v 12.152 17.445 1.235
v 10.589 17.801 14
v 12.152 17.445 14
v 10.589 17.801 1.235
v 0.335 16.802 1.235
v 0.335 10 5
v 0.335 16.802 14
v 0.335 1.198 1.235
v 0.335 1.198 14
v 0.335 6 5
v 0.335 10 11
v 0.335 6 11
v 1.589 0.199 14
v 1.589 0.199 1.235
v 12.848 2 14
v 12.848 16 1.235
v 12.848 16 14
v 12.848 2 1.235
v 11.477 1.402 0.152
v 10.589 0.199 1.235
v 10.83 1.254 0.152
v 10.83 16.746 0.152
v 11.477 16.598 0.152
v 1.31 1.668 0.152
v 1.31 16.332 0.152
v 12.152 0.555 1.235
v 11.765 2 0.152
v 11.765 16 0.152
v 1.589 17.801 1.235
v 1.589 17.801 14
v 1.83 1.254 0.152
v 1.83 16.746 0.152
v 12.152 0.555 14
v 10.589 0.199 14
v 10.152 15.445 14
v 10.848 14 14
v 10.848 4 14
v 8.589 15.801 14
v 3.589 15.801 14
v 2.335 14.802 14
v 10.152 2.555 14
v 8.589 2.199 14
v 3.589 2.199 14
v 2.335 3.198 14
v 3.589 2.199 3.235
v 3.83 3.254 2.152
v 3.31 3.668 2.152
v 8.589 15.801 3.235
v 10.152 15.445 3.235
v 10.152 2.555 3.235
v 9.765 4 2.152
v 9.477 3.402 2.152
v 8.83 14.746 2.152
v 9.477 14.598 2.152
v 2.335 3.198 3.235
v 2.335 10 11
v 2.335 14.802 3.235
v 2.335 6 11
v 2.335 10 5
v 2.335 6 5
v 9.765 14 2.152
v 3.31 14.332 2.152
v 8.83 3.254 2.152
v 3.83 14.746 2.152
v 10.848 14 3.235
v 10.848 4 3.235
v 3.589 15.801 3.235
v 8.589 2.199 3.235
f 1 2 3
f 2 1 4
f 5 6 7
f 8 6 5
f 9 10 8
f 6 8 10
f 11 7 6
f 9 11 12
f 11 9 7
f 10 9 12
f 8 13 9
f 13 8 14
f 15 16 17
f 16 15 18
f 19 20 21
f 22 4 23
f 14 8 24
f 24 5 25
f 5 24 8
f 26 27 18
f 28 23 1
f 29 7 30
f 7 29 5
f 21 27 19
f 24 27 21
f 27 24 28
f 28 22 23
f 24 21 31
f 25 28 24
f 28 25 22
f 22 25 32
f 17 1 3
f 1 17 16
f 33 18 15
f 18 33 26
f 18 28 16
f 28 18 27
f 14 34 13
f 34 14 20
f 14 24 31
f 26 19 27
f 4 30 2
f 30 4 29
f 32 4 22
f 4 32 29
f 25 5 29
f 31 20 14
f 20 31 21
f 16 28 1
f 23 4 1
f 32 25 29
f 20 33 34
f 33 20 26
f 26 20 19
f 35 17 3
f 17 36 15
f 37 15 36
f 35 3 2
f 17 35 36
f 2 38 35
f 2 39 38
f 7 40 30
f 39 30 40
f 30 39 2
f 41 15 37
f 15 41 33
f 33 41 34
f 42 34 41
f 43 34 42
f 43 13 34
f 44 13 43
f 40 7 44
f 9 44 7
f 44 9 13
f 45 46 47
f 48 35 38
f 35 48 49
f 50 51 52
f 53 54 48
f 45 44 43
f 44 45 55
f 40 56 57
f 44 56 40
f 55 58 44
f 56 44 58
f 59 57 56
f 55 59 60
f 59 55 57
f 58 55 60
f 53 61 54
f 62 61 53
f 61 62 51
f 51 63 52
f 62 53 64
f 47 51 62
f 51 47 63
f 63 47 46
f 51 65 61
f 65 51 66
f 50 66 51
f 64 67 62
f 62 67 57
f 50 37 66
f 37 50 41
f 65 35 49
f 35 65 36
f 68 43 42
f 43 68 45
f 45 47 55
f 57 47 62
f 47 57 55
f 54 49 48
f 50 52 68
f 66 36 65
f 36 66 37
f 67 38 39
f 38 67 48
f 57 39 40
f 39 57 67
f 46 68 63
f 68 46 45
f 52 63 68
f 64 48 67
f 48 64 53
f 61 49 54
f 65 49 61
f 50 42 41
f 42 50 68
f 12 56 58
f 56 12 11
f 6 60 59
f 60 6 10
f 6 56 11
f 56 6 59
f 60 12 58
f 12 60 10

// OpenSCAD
// file: ../utility/round-bottom-box.scad
module spheres(width,length,height,radius) {
  translate([radius,radius,radius]) sphere(radius);
  translate([width - radius, length - radius, radius]) sphere(radius);
  translate([width - radius, radius, radius]) sphere(radius);
  translate([radius, length - radius, radius]) sphere(radius);
}

module slicer(width, length, z_up, height) {
  translate([0, 0, z_up]) cube([width, length, height]); 
}

module round_bottom_box(width, length, height, radius) {
  difference() {
    hull() {
      spheres(width,length,height,radius);
      translate([0,0,height]) spheres(width,length,height,radius);
    }
    slicer(width, length, height+radius, radius+1);
  }
}

module hollow_round_bottom_box(width, length, height, radius, wall = 2) {
 inside_width = width - (2 * wall);
 inside_length = length - (2 * wall);
 inside_height = height;
 difference() {
   round_bottom_box(width, length, height, radius);
   translate ([wall, wall, wall]) 
     round_bottom_box(inside_width, inside_length, inside_height, radius);
 }
}
// main file
use <../utility/round-bottom-box.scad>

module shell() {
  difference() {
    round_bottom_box (13,18,12,2);
    translate([2, 2, 2])
      round_bottom_box (9,14,10,2); 
  }
}

module cord() {
  translate([0,6,5])
    cube([4,4,6]);
}

module lid_box() {
  difference() {
    round_bottom_box(15, 20, 10, 2);
    translate([2, 2, 2])
      round_bottom_box(11, 16, 8, 2);
  }
}

module hole_for_switch() {
  translate([3,2,0]) {
    cube([9, 14, 18]);
  }
}

module lid() {
  difference() {
    lid_box();
    hole_for_switch();
  }
}

module bottom() {
  difference() {
    shell();
    cord();
  }
}

bottom();
